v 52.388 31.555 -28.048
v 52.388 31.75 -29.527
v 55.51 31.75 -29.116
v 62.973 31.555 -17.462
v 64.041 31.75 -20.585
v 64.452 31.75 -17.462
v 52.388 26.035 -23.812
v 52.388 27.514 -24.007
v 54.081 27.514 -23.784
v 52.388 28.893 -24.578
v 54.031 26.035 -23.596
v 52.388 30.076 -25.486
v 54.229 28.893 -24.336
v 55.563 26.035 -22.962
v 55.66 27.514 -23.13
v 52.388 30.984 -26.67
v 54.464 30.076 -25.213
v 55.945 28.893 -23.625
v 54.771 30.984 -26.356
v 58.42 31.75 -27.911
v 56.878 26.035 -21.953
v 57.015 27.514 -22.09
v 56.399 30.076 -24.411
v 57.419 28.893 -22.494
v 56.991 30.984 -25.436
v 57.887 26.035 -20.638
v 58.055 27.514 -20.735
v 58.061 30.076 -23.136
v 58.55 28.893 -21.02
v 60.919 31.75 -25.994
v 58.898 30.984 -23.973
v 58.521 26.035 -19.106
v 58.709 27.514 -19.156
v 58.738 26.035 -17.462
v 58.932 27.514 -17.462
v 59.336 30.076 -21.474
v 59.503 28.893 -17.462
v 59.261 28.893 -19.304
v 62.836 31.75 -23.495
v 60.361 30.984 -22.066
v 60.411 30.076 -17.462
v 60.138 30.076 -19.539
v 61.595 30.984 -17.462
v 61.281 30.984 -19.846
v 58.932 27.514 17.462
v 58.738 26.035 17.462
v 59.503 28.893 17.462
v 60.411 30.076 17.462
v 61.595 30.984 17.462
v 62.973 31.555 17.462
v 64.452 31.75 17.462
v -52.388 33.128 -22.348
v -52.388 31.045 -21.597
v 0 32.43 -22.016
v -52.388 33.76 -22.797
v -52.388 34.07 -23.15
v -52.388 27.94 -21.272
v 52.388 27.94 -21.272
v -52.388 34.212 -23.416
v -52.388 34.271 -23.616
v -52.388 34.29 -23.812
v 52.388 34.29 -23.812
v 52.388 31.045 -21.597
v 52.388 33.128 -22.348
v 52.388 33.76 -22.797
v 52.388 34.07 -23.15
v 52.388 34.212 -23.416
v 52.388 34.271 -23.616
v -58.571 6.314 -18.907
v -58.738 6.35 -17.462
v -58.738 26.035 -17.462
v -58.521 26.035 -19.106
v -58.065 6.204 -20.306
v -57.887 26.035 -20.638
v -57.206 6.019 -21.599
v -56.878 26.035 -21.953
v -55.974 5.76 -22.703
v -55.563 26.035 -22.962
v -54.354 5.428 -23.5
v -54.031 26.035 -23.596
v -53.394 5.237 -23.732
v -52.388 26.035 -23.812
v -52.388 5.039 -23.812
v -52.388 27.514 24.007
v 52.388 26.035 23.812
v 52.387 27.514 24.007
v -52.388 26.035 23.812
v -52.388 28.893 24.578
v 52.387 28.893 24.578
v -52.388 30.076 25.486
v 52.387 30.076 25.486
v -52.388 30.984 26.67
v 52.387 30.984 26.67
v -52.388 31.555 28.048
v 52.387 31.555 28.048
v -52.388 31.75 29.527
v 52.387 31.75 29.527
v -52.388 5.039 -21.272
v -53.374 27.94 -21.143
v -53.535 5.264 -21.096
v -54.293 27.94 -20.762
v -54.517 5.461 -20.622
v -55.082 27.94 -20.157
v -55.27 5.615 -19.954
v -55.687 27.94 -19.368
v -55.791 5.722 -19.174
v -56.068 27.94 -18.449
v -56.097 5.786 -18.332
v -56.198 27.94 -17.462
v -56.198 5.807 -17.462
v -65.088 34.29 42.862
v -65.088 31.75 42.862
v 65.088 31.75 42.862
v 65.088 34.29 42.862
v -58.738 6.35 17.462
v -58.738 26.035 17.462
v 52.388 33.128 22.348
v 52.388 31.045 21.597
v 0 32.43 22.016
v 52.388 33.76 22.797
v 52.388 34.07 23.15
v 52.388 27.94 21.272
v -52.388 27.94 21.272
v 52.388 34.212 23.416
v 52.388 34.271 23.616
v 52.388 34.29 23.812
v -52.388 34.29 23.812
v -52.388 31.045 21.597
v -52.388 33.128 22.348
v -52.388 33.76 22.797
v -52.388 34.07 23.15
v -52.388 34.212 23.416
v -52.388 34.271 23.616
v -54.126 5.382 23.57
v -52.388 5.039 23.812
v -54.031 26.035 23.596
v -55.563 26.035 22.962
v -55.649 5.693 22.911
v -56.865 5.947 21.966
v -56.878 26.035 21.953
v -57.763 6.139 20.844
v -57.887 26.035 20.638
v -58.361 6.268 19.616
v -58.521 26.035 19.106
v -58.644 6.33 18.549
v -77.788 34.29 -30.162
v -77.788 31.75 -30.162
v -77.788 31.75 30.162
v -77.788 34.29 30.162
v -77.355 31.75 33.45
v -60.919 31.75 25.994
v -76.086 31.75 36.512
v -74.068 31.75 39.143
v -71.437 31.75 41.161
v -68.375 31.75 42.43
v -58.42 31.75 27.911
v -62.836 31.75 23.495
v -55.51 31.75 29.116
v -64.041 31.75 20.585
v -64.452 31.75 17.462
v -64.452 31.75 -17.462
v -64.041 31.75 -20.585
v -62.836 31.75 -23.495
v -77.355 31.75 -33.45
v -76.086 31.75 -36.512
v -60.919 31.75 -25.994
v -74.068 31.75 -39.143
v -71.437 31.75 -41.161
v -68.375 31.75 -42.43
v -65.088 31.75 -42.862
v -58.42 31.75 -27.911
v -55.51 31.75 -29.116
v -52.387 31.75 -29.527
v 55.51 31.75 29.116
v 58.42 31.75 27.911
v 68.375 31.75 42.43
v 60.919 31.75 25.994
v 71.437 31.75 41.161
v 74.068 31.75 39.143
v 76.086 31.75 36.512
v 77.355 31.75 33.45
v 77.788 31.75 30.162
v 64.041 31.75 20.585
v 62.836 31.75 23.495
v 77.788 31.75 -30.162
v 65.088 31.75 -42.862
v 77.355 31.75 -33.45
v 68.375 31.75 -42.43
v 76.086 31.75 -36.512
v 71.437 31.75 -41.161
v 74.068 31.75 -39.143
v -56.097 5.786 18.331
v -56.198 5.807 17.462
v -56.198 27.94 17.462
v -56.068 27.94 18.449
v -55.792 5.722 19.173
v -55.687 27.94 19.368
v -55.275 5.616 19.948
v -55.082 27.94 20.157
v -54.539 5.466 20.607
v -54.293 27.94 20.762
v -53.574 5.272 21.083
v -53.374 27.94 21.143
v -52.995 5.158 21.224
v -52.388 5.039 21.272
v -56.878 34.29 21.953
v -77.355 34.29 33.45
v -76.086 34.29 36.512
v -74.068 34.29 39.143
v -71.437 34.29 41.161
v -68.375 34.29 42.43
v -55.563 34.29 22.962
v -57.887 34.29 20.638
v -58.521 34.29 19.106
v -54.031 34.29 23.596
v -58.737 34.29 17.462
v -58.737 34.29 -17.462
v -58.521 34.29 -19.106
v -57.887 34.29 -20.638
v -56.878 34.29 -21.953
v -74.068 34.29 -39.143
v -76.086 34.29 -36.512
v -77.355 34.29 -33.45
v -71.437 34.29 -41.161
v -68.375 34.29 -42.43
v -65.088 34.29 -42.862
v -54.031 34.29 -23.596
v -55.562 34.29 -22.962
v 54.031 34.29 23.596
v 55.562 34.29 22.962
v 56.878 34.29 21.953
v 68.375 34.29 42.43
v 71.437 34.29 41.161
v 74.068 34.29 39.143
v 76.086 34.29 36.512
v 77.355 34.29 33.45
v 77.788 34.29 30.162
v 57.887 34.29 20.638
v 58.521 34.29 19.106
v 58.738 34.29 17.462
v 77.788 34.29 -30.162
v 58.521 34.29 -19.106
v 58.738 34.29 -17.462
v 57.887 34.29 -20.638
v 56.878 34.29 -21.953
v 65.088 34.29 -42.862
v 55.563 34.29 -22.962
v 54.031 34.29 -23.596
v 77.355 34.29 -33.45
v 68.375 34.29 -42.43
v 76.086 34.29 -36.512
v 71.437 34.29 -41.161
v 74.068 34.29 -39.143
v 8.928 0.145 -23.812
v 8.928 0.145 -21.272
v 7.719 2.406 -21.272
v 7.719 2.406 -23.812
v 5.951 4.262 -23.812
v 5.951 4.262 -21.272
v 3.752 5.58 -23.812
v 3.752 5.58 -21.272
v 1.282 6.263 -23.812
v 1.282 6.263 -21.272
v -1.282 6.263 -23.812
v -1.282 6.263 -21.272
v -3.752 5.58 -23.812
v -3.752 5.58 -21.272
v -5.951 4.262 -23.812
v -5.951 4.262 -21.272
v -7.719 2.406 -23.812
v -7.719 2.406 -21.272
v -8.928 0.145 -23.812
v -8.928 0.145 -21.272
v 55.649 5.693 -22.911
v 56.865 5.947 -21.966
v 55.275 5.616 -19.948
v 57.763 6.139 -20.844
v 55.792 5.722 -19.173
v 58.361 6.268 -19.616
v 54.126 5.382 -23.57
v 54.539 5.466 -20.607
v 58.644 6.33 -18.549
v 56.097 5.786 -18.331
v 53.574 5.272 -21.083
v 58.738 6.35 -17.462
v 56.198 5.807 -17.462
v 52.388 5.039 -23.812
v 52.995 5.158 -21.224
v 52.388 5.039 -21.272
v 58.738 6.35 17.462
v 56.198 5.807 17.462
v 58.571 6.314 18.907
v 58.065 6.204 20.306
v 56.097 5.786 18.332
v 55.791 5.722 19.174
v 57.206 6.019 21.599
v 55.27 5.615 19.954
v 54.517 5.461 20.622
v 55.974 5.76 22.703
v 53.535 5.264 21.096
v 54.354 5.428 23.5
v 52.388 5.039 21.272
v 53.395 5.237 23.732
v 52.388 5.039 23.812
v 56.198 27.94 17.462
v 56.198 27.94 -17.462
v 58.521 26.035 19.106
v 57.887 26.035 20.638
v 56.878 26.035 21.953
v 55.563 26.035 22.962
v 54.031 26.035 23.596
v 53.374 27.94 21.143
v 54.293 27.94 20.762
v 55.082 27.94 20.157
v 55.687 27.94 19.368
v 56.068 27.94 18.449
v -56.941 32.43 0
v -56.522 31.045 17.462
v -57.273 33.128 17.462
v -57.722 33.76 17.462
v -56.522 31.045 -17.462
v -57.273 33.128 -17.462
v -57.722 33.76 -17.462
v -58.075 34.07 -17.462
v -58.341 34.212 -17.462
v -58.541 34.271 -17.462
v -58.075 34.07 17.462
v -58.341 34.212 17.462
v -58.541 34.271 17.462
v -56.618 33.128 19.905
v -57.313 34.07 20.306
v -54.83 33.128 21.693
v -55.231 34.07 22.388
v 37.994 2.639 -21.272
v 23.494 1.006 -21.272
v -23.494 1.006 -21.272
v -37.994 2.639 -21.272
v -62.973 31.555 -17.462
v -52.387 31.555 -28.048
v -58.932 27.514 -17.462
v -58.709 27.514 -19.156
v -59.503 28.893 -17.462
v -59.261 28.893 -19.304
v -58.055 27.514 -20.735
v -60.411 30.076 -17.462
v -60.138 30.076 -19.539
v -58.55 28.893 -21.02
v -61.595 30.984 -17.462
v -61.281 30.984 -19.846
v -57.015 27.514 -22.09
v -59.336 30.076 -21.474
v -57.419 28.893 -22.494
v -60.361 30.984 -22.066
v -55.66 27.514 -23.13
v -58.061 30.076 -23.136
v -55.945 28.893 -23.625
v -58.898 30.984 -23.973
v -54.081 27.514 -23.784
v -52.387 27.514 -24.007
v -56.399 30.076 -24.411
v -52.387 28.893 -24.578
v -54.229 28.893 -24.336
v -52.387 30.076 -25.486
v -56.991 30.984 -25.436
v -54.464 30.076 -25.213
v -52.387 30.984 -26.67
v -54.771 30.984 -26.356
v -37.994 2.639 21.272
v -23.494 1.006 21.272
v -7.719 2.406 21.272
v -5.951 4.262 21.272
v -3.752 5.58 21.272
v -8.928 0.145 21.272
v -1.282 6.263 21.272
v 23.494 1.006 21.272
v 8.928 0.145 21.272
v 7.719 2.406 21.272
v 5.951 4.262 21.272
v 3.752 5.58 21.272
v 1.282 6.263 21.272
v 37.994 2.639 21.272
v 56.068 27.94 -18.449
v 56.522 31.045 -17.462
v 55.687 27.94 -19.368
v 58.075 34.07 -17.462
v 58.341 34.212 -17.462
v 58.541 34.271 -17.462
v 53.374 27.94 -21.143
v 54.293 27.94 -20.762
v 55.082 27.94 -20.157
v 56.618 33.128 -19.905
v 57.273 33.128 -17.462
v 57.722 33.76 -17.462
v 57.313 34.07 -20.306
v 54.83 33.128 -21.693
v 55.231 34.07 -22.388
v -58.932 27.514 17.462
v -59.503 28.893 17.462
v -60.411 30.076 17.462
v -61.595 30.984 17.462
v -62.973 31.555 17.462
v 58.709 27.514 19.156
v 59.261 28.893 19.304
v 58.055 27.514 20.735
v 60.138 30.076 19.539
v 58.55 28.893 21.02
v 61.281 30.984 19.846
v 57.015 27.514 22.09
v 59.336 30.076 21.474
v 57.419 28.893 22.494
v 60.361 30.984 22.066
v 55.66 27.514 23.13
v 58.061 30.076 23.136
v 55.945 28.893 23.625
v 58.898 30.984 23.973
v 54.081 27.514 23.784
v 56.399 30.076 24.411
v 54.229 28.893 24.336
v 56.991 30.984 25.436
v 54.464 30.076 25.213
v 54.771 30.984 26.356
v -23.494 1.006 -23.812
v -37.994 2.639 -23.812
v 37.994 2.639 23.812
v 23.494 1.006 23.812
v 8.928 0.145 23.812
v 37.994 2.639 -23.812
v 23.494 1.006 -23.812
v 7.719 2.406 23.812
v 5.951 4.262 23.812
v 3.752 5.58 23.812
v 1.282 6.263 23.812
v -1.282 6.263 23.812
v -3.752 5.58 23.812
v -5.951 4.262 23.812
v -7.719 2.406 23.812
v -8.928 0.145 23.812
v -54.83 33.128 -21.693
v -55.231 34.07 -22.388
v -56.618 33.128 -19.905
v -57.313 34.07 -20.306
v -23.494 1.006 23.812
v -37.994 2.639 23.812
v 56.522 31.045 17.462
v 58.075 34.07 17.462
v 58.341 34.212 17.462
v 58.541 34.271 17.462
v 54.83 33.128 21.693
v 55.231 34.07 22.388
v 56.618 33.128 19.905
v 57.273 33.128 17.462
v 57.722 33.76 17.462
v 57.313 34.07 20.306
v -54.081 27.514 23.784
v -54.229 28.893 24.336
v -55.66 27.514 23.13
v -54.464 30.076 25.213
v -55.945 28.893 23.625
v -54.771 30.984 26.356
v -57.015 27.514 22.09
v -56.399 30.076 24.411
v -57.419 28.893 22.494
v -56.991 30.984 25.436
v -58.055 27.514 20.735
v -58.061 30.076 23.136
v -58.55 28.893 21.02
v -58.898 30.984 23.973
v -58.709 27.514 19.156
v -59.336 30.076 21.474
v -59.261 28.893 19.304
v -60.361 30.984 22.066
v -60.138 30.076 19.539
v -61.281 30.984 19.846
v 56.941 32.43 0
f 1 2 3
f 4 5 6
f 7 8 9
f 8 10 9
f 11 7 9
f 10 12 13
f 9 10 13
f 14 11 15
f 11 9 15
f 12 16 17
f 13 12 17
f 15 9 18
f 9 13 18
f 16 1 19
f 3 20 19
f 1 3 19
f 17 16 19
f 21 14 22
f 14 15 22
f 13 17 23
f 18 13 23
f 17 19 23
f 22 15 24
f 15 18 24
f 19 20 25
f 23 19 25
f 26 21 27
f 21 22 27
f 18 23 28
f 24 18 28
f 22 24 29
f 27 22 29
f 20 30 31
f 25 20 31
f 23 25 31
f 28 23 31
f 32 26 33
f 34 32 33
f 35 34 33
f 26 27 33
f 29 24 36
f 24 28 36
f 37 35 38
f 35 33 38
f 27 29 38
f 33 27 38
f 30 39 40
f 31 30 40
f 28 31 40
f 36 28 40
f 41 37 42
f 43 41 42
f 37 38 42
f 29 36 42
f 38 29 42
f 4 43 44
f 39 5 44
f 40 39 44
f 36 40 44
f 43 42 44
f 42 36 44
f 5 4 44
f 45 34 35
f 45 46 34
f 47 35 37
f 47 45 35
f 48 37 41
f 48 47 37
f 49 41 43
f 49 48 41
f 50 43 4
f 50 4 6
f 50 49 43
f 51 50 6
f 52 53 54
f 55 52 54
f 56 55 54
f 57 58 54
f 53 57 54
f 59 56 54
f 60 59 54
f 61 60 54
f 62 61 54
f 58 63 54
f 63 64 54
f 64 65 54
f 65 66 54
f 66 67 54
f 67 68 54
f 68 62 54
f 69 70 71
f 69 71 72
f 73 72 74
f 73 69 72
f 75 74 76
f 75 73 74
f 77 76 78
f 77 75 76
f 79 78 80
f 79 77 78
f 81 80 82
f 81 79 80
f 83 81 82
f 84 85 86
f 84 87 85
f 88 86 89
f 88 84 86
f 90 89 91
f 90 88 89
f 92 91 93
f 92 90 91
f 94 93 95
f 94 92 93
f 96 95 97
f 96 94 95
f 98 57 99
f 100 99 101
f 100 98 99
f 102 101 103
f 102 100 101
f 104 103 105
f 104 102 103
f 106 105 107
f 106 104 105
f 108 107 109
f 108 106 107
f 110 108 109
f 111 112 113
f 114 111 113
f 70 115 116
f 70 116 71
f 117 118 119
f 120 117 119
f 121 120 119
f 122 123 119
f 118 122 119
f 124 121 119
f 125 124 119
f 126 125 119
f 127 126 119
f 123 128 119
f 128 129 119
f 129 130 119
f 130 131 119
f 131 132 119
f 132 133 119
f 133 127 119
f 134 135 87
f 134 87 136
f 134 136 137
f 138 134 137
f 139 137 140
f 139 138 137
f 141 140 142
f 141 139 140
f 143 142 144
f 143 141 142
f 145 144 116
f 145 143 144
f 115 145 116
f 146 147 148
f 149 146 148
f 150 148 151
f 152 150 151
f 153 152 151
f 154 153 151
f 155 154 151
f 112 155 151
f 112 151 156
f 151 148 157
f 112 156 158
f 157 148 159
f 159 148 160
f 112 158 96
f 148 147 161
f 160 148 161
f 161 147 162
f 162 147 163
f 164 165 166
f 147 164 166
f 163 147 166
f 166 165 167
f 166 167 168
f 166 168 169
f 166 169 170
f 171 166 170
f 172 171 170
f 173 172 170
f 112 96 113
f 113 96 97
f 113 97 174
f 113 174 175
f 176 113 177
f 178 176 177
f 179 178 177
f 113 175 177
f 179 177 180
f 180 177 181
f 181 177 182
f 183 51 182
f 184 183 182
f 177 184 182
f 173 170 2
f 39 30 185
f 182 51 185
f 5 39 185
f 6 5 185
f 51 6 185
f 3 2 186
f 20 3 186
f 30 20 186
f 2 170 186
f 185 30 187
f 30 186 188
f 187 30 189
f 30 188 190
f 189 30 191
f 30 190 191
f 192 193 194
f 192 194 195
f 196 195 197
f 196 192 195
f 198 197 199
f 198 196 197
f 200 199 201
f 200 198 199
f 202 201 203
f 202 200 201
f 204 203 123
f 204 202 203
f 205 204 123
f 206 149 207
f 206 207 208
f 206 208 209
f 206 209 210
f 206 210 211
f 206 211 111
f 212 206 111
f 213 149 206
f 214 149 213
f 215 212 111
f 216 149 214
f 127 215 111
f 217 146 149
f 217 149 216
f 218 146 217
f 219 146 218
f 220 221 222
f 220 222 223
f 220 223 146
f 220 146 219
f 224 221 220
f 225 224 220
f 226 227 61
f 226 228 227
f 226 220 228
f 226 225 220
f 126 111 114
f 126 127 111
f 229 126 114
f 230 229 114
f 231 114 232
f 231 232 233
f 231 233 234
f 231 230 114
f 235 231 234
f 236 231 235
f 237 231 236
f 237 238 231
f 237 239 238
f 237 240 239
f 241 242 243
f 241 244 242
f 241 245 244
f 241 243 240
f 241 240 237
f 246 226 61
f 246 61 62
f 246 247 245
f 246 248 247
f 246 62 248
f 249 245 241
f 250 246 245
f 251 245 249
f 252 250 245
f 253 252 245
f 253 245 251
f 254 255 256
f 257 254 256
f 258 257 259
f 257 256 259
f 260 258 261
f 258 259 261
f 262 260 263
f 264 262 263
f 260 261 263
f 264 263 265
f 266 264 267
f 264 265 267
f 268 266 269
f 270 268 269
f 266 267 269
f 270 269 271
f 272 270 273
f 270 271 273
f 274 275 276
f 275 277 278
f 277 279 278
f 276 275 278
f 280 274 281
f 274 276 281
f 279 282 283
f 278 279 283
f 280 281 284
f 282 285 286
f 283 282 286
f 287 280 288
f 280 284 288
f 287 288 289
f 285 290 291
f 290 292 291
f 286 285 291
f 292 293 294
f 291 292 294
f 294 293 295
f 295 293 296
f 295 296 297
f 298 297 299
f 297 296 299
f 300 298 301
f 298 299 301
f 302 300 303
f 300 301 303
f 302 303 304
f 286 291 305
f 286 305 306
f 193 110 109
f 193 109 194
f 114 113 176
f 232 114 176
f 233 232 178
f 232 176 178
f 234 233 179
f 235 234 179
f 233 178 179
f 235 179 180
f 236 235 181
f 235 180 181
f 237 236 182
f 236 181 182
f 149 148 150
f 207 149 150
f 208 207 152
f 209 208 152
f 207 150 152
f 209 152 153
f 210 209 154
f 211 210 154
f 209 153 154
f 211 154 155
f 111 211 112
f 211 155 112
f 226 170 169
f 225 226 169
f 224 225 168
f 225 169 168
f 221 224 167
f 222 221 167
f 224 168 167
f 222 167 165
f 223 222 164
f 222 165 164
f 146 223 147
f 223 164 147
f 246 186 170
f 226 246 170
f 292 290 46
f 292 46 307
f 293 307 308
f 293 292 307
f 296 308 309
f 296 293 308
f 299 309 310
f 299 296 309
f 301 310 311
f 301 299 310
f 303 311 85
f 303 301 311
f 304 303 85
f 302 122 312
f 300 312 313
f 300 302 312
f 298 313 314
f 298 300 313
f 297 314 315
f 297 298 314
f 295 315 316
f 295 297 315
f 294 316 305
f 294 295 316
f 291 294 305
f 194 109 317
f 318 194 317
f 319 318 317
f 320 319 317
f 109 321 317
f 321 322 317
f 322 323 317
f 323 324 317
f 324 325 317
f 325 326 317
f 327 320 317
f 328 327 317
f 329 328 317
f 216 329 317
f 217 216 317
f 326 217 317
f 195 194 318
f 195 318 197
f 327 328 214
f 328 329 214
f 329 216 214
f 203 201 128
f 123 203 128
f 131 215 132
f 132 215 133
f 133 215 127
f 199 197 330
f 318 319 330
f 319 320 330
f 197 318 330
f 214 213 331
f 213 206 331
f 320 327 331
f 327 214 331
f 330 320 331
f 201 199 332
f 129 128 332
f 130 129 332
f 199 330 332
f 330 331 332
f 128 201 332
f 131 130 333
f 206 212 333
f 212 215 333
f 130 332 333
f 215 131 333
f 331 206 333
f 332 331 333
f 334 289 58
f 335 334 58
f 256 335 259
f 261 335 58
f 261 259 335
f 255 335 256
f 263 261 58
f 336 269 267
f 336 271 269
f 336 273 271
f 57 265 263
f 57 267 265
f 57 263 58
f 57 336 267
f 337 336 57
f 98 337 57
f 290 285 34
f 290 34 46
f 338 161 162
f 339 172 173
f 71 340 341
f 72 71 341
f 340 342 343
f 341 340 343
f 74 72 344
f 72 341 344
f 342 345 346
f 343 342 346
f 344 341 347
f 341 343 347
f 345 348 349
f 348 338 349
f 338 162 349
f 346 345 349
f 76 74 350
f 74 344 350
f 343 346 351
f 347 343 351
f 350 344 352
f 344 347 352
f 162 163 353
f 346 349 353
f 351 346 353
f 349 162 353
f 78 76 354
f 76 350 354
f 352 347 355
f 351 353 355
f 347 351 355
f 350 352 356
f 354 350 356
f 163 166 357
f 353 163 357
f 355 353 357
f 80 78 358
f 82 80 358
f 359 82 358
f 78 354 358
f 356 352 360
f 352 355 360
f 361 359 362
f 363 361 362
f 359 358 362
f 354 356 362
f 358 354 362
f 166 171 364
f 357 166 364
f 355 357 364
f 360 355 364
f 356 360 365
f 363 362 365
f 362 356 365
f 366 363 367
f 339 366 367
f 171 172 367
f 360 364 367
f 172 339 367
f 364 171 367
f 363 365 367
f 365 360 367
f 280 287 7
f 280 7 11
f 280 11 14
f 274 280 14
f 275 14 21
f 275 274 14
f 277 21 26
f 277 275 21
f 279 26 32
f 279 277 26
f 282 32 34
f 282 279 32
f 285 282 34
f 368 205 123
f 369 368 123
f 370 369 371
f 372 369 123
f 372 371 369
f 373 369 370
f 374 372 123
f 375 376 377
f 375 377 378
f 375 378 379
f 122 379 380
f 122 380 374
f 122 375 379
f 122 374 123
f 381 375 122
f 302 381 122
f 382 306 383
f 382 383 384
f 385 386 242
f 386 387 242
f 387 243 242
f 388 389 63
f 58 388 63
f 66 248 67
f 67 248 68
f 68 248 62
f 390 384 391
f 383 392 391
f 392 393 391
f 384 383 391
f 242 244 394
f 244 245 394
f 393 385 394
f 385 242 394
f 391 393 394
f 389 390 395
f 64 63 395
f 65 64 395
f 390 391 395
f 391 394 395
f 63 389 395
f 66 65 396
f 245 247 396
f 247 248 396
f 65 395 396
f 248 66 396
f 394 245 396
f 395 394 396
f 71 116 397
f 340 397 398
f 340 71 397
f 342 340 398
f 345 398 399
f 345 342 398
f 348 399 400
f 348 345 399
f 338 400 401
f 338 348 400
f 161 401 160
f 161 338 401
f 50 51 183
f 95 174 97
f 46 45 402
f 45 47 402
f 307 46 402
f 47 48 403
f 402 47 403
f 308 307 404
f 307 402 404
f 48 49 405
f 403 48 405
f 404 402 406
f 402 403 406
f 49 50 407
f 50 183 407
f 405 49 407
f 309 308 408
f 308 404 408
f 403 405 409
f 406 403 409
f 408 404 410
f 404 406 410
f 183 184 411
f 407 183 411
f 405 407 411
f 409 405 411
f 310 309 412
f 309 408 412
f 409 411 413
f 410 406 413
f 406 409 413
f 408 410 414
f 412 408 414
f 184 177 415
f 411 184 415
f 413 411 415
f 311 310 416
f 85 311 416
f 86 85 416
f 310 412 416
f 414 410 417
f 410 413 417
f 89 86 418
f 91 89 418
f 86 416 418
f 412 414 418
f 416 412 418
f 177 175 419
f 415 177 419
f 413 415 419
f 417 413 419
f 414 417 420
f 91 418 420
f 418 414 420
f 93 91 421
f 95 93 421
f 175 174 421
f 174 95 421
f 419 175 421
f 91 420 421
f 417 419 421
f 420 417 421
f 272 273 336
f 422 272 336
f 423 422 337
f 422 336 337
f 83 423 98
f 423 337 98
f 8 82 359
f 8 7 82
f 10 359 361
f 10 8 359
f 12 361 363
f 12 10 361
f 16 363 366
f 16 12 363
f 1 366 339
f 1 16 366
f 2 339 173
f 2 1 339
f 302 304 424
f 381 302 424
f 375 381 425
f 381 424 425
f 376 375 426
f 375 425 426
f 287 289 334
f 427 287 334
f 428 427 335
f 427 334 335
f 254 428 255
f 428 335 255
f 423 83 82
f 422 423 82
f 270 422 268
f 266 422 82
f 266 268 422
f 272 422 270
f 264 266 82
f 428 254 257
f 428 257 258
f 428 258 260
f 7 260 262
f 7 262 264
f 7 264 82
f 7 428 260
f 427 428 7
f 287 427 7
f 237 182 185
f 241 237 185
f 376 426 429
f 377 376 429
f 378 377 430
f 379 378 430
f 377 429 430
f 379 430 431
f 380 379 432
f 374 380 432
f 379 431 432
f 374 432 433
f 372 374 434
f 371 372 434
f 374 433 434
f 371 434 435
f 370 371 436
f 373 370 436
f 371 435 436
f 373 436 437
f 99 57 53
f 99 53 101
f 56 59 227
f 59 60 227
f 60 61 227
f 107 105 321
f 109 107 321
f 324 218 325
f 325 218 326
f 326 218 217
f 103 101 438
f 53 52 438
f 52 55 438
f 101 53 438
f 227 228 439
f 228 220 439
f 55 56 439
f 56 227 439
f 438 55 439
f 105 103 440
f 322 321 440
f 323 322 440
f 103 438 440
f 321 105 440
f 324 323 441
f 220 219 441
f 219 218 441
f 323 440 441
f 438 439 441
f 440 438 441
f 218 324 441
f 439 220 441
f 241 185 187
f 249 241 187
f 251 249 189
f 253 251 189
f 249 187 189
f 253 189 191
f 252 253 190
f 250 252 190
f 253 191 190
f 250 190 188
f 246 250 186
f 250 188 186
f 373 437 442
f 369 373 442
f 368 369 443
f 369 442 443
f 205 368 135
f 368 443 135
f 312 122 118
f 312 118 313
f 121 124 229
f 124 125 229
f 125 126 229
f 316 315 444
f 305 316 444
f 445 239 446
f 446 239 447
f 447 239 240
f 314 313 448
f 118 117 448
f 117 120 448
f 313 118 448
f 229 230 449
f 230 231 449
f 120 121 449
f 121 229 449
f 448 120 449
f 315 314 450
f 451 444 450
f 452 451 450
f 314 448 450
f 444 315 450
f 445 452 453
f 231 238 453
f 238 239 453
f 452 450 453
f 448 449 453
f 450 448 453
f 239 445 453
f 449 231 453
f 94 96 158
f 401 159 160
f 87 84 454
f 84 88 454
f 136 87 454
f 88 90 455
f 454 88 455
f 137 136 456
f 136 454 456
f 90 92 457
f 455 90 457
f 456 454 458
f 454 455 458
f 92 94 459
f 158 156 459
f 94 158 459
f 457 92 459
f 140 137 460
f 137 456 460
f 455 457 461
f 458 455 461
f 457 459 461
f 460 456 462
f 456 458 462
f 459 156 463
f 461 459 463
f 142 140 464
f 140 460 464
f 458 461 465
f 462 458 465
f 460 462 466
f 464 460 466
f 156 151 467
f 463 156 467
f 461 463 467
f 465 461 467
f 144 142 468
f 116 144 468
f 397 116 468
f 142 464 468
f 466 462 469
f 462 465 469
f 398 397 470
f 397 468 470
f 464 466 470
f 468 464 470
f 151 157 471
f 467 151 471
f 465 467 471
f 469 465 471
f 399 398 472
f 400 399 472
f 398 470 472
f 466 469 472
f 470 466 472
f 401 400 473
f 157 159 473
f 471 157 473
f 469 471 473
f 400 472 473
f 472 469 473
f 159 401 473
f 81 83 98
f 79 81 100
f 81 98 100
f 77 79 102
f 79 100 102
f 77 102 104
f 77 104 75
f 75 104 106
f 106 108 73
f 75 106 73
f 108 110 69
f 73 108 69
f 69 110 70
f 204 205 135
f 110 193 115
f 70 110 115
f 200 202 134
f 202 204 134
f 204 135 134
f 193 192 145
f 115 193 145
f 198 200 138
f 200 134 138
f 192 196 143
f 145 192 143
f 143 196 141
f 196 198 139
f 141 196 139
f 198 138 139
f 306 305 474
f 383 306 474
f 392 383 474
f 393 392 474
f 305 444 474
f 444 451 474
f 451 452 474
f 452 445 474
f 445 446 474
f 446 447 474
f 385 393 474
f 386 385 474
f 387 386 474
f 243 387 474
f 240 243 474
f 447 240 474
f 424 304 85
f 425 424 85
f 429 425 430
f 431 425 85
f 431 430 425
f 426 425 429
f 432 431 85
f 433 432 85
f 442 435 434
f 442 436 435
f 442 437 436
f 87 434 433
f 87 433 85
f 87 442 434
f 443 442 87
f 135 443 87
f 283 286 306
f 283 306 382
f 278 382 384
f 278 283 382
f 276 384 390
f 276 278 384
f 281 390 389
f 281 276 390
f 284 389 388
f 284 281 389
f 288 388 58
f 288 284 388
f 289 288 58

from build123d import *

# Parameters (mm, degrees)
BOSS_EXTRUDE1_DEPTH = 31.75
BOSS_EXTRUDE2_DEPTH = 2.54
FILLET1_R           = 5.715
FILLET3_SIZE        = 6.35
FILLET3_SIZE_2      = 2.54
CUT_EXTRUDE1_DEPTH  = 109.038210315


with BuildPart() as part:
    # Sketch1 → Boss-Extrude1 (new body)
    with BuildSketch(Plane(origin=(0, 0, 0), x_dir=(1, 0, 0), z_dir=(0, 1, 0))):
        with BuildLine():
            Line((-52.3875, 23.8125), (52.3875, 23.8125))
            ThreePointArc((52.3875, 23.8125), (56.877628061, 21.952628061), (58.7375, 17.4625))
            Line((58.7375, 17.4625), (58.7375, -17.4625))
            ThreePointArc((58.7375, -17.4625), (56.877628061, -21.952628061), (52.3875, -23.8125))
            Line((52.3875, -23.8125), (-52.3875, -23.8125))
            ThreePointArc((-52.3875, -23.8125), (-56.877628061, -21.952628061), (-58.7375, -17.4625))
            Line((-58.7375, -17.4625), (-58.7375, 17.4625))
            ThreePointArc((-58.7375, 17.4625), (-56.877628061, 21.952628061), (-52.3875, 23.8125))
        make_face()
        with BuildLine():
            Line((-56.1975, 17.4625), (-56.1975, -17.4625))
            ThreePointArc((-56.1975, -17.4625), (-55.081576836, -20.156576836), (-52.3875, -21.2725))
            Line((-52.3875, -21.2725), (52.3875, -21.2725))
            ThreePointArc((52.3875, -21.2725), (55.081576836, -20.156576836), (56.1975, -17.4625))
            Line((56.1975, -17.4625), (56.1975, 17.4625))
            ThreePointArc((56.1975, 17.4625), (55.081576836, 20.156576836), (52.3875, 21.2725))
            Line((52.3875, 21.2725), (-52.3875, 21.2725))
            ThreePointArc((-52.3875, 21.2725), (-55.081576836, 20.156576836), (-56.1975, 17.4625))
        make_face(mode=Mode.SUBTRACT)
    extrude(amount=BOSS_EXTRUDE1_DEPTH)

    # Sketch2 → Boss-Extrude2 (add)
    with BuildSketch(Plane(origin=(0, 31.75, 0), x_dir=(1, 0, 0), z_dir=(0, 1, 0))):
        with BuildLine():
            Line((-65.0875, -42.8625), (65.0875, -42.8625))
            ThreePointArc((65.0875, -42.8625), (74.067756121, -39.142756121), (77.7875, -30.1625))
            Line((77.7875, -30.1625), (77.7875, 30.1625))
            ThreePointArc((77.7875, 30.1625), (74.067756121, 39.142756121), (65.0875, 42.8625))
            Line((65.0875, 42.8625), (-65.0875, 42.8625))
            ThreePointArc((-65.0875, 42.8625), (-74.067756121, 39.142756121), (-77.7875, 30.1625))
            Line((-77.7875, 30.1625), (-77.7875, -30.1625))
            ThreePointArc((-77.7875, -30.1625), (-74.067756121, -39.142756121), (-65.0875, -42.8625))
        make_face()
        with BuildLine():
            Line((52.3875, 21.2725), (-52.3875, 21.2725))
            ThreePointArc((-52.3875, 21.2725), (-55.081576836, 20.156576836), (-56.1975, 17.4625))
            Line((-56.1975, 17.4625), (-56.1975, -17.4625))
            ThreePointArc((-56.1975, -17.4625), (-55.081576836, -20.156576836), (-52.3875, -21.2725))
            Line((-52.3875, -21.2725), (52.3875, -21.2725))
            ThreePointArc((52.3875, -21.2725), (55.081576836, -20.156576836), (56.1975, -17.4625))
            Line((56.1975, -17.4625), (56.1975, 17.4625))
            ThreePointArc((56.1975, 17.4625), (55.081576836, 20.156576836), (52.3875, 21.2725))
        make_face(mode=Mode.SUBTRACT)
    extrude(amount=BOSS_EXTRUDE2_DEPTH)

    # Fillet1
    fillet1_edges = [part.edges().sort_by_distance(p)[0] for p in [
        (-56.877628061, 31.75, -21.952628061),
        (-58.7375, 31.75, 0),
        (-56.877628061, 31.75, 21.952628061),
        (0, 31.75, 23.8125),
        (56.877628061, 31.75, 21.952628061),
        (58.7375, 31.75, 0),
        (56.877628061, 31.75, -21.952628061),
        (0, 31.75, -23.8125),
    ]]
    fillet(fillet1_edges, radius=FILLET1_R)

    # Fillet3
    # an asymmetric fillet: 6.35, 2.54 mm, written as the material it takes off along each edge
    with BuildSketch(Plane(origin=(-52.3875, 34.29, 21.2725), x_dir=(0, -1, 0), z_dir=(1, 0, 0)), Plane(origin=(52.3875, 34.29, -21.2725), x_dir=(0, -1, 0), z_dir=(-1, 0, 0))) as fillet3_piece_1:
        with BuildLine():
            Bezier((FILLET3_SIZE, 0), (0, 0), (0, -FILLET3_SIZE_2), weights=[1, 0.707106781, 1])
            Line((0, -FILLET3_SIZE_2), (0, 0))
            Line((0, 0), (FILLET3_SIZE, 0))
        make_face()
    extrude(amount=104.775, mode=Mode.SUBTRACT)
    with BuildSketch(Plane(origin=(52.3875, 34.29, 17.4625), x_dir=(0, 0, 1), z_dir=(-1, 0, 0))) as fillet3_piece_2:
        with BuildLine():
            Bezier((3.81, -FILLET3_SIZE), (3.81, 0), (3.81 + FILLET3_SIZE_2, 0), weights=[1, 0.707106781, 1])
            Line((3.81 + FILLET3_SIZE_2, 0), (3.81, 0))
            Line((3.81, 0), (3.81, -FILLET3_SIZE))
        make_face()
    revolve(axis=Axis((52.3875, 34.29, 17.4625), (0, 1, 0)), revolution_arc=90, mode=Mode.SUBTRACT)
    with BuildSketch(Plane(origin=(-52.3875, 34.29, 17.4625), x_dir=(-1, 0, 0), z_dir=(0, 0, -1))) as fillet3_piece_3:
        with BuildLine():
            Bezier((3.81, -FILLET3_SIZE), (3.81, 0), (3.81 + FILLET3_SIZE_2, 0), weights=[1, 0.707106781, 1])
            Line((3.81 + FILLET3_SIZE_2, 0), (3.81, 0))
            Line((3.81, 0), (3.81, -FILLET3_SIZE))
        make_face()
    revolve(axis=Axis((-52.3875, 34.29, 17.4625), (0, 1, 0)), revolution_arc=90, mode=Mode.SUBTRACT)
    with BuildSketch(Plane(origin=(56.1975, 34.29, 17.4625), x_dir=(0, -1, 0), z_dir=(0, 0, -1)), Plane(origin=(-56.1975, 34.29, -17.4625), x_dir=(0, -1, 0), z_dir=(0, 0, 1))) as fillet3_piece_4:
        with BuildLine():
            Bezier((FILLET3_SIZE, 0), (0, 0), (0, -FILLET3_SIZE_2), weights=[1, 0.707106781, 1])
            Line((0, -FILLET3_SIZE_2), (0, 0))
            Line((0, 0), (FILLET3_SIZE, 0))
        make_face()
    extrude(amount=34.925, mode=Mode.SUBTRACT)
    with BuildSketch(Plane(origin=(52.3875, 34.29, -17.4625), x_dir=(1, 0, 0), z_dir=(0, 0, 1))) as fillet3_piece_5:
        with BuildLine():
            Bezier((3.81, -FILLET3_SIZE), (3.81, 0), (3.81 + FILLET3_SIZE_2, 0), weights=[1, 0.707106781, 1])
            Line((3.81 + FILLET3_SIZE_2, 0), (3.81, 0))
            Line((3.81, 0), (3.81, -FILLET3_SIZE))
        make_face()
    revolve(axis=Axis((52.3875, 34.29, -17.4625), (0, 1, 0)), revolution_arc=90, mode=Mode.SUBTRACT)
    with BuildSketch(Plane(origin=(-52.3875, 34.29, -17.4625), x_dir=(0, 0, -1), z_dir=(1, 0, 0))) as fillet3_piece_6:
        with BuildLine():
            Bezier((3.81, -FILLET3_SIZE), (3.81, 0), (3.81 + FILLET3_SIZE_2, 0), weights=[1, 0.707106781, 1])
            Line((3.81 + FILLET3_SIZE_2, 0), (3.81, 0))
            Line((3.81, 0), (3.81, -FILLET3_SIZE))
        make_face()
    revolve(axis=Axis((-52.3875, 34.29, -17.4625), (0, 1, 0)), revolution_arc=90, mode=Mode.SUBTRACT)

    # Sketch3 → Cut-Extrude1 (cut, through all)
    with BuildSketch(Plane.XY.offset(23.8125)):
        with BuildLine():
            Line((-52.3875, 0), (-52.3875, 5.03908358))
            ThreePointArc((-52.3875, 5.03908358), (-55.566366011, 5.675815064), (-58.7375, 6.35))
            Line((-58.7375, 6.35), (-58.7375, 0))
            Line((-58.7375, 0), (-52.3875, 0))
        make_face()
        with BuildLine():
            ThreePointArc((-8.980256121, 0), (-8.954247565, 0.07262614), (-8.927651669, 0.145039258))
            ThreePointArc((-8.927651669, 0.145039258), (-30.755078825, 1.726220229), (-52.3875, 5.03908358))
            Line((-52.3875, 5.03908358), (-52.3875, 0))
            Line((-52.3875, 0), (-8.980256121, 0))
        make_face()
        with BuildLine():
            ThreePointArc((-1.188e-06, 0), (4.464414281, 0.036262197), (8.927651669, 0.145039258))
            ThreePointArc((8.927651669, 0.145039258), (0, 6.35), (-8.927651669, 0.145039258))
            ThreePointArc((-8.927651669, 0.145039258), (-4.464415469, 0.036262216), (-1.188e-06, 0))
        make_face()
        with BuildLine():
            ThreePointArc((8.980256121, 0), (8.954247565, 0.07262614), (8.927651669, 0.145039258))
            ThreePointArc((8.927651669, 0.145039258), (4.464414281, 0.036262197), (-1.188e-06, 0))
            Line((-1.188e-06, 0), (8.980256121, 0))
        make_face()
        with BuildLine():
            ThreePointArc((-1.188e-06, 0), (-4.464415469, 0.036262216), (-8.927651669, 0.145039258))
            ThreePointArc((-8.927651669, 0.145039258), (-8.954247565, 0.07262614), (-8.980256121, 0))
            Line((-8.980256121, 0), (-1.188e-06, 0))
        make_face()
        with BuildLine():
            Line((52.3875, 0), (52.3875, 5.03908358))
            ThreePointArc((52.3875, 5.03908358), (30.755078825, 1.726220229), (8.927651669, 0.145039258))
            ThreePointArc((8.927651669, 0.145039258), (8.954247565, 0.07262614), (8.980256121, 0))
            Line((8.980256121, 0), (52.3875, 0))
        make_face()
        with BuildLine():
            Line((58.7375, 0), (58.7375, 6.35))
            ThreePointArc((58.7375, 6.35), (55.566366011, 5.675815064), (52.3875, 5.03908358))
            Line((52.3875, 5.03908358), (52.3875, 0))
            Line((52.3875, 0), (58.7375, 0))
        make_face()
    extrude(amount=-CUT_EXTRUDE1_DEPTH, mode=Mode.SUBTRACT)


solid = part.part
